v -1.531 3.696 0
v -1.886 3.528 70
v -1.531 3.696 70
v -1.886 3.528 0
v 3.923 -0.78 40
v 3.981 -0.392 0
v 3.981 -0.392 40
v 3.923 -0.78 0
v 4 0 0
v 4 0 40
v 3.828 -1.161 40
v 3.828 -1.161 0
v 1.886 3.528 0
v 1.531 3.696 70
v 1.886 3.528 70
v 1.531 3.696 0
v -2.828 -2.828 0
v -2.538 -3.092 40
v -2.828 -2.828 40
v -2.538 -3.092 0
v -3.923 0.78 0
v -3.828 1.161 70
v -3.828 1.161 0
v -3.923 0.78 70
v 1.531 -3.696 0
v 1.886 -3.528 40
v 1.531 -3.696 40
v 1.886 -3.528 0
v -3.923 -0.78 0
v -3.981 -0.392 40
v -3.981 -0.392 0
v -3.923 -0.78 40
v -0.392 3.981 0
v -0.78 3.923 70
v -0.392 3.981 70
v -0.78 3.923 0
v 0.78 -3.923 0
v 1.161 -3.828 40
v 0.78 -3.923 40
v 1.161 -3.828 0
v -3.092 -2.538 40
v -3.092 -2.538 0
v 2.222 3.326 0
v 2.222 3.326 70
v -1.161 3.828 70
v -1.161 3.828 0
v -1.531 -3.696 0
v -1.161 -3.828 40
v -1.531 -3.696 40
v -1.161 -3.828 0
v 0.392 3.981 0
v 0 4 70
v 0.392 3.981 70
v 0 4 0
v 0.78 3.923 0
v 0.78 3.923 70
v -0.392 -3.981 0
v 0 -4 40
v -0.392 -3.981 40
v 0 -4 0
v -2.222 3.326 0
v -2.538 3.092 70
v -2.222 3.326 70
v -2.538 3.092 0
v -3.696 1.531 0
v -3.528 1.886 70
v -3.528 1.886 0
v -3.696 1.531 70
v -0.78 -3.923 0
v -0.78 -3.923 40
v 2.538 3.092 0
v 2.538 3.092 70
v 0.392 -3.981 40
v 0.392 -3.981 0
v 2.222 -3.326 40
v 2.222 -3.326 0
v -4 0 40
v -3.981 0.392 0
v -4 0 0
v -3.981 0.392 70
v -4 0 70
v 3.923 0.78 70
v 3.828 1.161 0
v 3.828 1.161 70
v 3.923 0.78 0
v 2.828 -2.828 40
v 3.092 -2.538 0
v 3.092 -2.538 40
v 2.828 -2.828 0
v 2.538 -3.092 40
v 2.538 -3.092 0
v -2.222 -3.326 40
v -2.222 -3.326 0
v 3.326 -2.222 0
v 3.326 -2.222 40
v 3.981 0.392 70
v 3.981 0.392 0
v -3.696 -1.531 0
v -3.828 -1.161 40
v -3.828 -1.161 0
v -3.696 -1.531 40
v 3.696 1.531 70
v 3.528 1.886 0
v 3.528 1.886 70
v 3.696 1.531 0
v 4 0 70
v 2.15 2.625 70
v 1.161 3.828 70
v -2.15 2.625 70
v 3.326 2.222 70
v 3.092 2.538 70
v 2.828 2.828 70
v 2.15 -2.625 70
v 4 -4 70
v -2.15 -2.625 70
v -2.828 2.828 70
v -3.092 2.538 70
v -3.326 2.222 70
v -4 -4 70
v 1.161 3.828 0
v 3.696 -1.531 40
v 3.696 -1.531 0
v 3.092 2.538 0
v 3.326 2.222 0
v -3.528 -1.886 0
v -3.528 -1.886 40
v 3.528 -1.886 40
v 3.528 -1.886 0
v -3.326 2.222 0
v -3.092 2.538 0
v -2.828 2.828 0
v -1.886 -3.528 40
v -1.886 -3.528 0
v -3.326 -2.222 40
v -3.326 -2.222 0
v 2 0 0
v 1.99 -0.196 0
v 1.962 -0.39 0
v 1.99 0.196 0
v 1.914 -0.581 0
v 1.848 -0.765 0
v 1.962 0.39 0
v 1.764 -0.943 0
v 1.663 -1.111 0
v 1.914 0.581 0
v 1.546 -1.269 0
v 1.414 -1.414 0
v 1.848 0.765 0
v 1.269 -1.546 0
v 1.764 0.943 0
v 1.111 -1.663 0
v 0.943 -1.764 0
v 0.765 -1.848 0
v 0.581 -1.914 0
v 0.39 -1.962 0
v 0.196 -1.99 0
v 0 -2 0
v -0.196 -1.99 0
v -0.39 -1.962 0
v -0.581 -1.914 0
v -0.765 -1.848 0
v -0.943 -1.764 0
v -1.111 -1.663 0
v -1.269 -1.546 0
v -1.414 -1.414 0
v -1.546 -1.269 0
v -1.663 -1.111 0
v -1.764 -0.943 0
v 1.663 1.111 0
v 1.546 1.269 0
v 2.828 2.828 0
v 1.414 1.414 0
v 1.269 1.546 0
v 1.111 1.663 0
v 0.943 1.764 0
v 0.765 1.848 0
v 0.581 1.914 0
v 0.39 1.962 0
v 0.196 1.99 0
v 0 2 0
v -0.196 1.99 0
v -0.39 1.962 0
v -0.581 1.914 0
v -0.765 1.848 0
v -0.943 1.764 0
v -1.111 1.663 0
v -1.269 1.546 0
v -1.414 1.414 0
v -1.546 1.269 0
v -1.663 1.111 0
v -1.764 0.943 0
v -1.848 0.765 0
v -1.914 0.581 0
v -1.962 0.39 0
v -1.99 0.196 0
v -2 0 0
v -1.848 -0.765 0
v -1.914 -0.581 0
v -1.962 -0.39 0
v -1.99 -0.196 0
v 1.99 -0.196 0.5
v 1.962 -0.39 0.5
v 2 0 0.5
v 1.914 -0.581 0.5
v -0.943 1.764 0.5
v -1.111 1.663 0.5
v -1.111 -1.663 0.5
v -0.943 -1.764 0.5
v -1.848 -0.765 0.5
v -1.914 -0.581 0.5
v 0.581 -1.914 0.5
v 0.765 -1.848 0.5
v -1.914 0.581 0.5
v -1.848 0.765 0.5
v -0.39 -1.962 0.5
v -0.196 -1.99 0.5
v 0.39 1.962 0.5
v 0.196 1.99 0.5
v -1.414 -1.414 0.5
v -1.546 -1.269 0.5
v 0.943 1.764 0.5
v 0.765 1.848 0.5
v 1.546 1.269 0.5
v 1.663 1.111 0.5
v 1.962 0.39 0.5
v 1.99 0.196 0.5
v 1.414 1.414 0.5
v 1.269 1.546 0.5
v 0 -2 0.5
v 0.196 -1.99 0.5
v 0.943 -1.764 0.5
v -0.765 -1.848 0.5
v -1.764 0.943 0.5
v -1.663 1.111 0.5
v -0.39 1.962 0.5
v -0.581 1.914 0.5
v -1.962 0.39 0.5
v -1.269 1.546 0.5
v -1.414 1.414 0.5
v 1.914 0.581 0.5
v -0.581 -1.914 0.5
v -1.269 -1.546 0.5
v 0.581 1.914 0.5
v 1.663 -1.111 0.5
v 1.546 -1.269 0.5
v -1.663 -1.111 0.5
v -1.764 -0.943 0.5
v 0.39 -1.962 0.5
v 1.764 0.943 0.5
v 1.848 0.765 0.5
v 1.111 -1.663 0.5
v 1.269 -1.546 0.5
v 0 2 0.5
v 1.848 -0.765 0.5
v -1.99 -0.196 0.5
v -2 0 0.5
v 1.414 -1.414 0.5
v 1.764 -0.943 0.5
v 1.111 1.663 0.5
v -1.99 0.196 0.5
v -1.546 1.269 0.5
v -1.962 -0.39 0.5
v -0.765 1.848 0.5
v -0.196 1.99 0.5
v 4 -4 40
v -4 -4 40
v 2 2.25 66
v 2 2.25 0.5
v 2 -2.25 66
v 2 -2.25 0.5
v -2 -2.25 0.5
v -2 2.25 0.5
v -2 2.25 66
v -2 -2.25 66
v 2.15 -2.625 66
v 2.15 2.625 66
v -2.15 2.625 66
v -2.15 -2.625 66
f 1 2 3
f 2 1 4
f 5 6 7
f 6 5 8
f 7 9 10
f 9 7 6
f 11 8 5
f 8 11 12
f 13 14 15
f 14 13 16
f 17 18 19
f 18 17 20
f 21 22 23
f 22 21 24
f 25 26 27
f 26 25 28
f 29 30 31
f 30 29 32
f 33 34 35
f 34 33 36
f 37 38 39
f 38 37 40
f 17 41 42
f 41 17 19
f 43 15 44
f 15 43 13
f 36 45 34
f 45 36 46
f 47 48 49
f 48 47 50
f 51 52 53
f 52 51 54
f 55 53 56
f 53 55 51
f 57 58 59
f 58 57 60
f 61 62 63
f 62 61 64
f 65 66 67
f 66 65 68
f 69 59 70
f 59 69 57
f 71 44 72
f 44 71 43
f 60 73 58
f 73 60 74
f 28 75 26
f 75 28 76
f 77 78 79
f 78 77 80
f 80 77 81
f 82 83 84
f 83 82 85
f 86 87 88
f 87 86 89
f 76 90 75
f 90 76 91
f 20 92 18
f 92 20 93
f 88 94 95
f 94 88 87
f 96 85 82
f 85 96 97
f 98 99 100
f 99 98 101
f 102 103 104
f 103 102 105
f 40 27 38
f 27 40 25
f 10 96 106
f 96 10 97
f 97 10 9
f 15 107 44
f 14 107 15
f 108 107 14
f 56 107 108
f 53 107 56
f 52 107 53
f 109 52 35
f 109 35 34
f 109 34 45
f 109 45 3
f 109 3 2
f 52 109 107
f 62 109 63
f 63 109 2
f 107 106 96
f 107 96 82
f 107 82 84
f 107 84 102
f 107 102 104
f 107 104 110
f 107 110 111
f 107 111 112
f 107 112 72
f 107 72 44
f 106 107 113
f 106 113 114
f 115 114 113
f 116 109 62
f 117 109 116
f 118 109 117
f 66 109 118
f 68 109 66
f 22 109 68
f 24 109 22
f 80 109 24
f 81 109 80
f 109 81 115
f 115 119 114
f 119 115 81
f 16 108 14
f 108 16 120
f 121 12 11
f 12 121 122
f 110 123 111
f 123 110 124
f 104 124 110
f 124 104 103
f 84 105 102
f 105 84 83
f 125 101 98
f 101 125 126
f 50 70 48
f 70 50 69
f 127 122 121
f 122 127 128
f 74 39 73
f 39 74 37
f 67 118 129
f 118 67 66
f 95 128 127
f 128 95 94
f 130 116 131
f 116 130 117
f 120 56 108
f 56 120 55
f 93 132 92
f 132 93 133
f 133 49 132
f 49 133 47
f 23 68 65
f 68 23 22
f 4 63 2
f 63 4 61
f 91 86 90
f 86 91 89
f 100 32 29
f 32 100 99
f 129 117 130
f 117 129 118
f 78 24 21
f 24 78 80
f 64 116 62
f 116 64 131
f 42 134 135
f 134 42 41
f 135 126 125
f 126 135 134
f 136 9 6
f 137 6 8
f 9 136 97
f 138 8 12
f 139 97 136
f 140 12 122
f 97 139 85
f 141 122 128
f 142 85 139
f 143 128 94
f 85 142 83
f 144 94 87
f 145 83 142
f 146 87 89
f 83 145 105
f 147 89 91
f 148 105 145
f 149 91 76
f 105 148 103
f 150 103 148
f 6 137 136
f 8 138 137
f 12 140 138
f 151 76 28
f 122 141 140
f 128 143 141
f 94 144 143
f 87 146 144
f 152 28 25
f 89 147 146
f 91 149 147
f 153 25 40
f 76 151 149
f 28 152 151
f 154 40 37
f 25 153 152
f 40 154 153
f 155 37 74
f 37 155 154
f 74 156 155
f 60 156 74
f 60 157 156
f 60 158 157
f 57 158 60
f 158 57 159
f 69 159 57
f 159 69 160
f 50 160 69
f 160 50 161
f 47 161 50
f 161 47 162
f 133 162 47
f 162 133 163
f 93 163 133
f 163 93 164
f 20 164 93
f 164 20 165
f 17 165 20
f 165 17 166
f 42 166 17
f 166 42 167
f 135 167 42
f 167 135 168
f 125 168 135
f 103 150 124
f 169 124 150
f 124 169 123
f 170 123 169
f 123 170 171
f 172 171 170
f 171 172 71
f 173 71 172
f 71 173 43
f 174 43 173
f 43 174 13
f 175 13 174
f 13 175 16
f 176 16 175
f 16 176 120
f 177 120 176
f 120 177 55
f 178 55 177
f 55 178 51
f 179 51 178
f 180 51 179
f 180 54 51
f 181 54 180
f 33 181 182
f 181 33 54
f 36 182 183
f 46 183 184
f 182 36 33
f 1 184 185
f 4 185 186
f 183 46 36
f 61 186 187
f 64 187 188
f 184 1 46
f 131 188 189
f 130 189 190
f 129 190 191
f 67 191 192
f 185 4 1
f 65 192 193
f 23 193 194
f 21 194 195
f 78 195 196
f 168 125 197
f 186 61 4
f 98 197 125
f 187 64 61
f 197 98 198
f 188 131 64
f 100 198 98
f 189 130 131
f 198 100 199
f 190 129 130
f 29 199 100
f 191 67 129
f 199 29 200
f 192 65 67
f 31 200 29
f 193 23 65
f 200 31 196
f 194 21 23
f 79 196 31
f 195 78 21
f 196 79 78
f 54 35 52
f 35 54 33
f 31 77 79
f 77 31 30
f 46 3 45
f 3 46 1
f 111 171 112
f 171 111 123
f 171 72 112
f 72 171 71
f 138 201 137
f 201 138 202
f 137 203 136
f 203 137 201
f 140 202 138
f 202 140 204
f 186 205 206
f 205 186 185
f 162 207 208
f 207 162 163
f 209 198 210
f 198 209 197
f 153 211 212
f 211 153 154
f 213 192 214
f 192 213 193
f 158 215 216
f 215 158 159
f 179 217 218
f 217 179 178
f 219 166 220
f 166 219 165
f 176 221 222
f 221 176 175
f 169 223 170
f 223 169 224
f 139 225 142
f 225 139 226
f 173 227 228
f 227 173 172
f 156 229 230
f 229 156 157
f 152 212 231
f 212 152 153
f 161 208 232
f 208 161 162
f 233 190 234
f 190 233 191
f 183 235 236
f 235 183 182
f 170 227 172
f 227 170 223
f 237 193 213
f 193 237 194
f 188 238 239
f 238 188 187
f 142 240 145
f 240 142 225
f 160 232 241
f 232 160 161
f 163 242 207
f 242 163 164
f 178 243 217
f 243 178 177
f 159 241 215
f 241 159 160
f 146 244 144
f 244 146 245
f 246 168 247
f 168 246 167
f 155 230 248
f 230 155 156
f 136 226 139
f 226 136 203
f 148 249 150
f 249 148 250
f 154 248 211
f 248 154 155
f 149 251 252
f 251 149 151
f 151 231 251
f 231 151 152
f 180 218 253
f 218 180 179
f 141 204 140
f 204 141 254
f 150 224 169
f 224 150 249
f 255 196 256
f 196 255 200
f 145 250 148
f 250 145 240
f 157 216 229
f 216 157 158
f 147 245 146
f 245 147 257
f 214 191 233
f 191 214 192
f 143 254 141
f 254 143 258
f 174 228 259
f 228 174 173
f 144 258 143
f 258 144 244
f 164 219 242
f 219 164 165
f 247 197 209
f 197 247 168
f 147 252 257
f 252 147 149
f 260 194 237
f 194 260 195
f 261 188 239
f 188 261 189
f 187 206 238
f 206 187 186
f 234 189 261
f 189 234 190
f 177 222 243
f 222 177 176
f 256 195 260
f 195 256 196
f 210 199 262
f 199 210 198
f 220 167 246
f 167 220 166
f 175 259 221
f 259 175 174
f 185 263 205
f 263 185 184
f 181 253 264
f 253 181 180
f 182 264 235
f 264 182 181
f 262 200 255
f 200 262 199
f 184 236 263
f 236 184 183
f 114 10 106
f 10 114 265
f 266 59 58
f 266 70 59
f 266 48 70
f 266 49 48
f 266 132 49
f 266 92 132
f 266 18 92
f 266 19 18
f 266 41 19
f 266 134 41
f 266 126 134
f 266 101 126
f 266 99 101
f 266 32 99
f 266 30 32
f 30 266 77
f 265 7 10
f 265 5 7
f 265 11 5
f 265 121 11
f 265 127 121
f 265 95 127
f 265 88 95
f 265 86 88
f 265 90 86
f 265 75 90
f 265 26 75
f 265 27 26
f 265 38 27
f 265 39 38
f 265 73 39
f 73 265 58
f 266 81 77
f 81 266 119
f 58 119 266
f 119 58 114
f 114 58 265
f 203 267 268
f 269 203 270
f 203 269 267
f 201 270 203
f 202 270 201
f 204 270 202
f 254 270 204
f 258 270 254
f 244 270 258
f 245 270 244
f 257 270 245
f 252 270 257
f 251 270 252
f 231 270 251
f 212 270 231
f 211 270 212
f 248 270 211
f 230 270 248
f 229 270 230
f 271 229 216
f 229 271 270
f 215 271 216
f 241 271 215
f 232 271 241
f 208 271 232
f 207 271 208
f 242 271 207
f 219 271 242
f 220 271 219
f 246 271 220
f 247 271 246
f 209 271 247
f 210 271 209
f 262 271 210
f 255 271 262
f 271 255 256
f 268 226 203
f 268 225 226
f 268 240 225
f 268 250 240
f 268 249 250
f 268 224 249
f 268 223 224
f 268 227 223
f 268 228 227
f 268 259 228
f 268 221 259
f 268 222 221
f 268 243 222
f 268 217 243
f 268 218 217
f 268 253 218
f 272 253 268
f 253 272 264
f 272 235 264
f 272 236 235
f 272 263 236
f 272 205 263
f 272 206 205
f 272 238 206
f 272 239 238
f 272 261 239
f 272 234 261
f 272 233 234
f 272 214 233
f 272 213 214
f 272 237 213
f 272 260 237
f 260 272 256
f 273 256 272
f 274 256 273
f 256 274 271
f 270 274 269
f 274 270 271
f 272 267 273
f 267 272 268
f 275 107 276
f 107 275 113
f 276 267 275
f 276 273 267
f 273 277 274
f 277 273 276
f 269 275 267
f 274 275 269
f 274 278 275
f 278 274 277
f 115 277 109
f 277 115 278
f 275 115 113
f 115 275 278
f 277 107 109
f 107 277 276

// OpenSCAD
photoDiodeLength = 4.5;
photoDiodeWidth = 4.0;
photoDiodeHeight = 2;

photoDiodeMaxLength = 5.25;
photoDiodeMaxWidth = 4.3;

bodyLength = 70;
bodyShellWidth = 2;
bodyOuterDiameter = photoDiodeWidth + (bodyShellWidth * 2);

pinholeDiameter = 4.0;
pinholeLength = 0.5;

supportLength = 30;

backOpeningLength = 2;

rotate([180, 0, 0]) {
    translate([0, 0, -bodyLength]) {
        difference() {
            difference() {
                union() {
                // Support
                translate([-(bodyOuterDiameter / 2), 0, 0])
                    cube([bodyOuterDiameter, (bodyOuterDiameter / 2), supportLength]);

                    difference() {
                        // Main body
                        cylinder(h = bodyLength, d = bodyOuterDiameter, center = false, $fn = 64);
                    
                        // Pinhole
                        translate([0, 0, (bodyLength - 2)])
                            cylinder(h = (pinholeLength * 6), d = pinholeDiameter, center = false, $fn = 64);       
                    }
                }

                // Main hole
                translate([-(photoDiodeWidth / 2), -(photoDiodeLength / 2), -pinholeLength])
                    cube([photoDiodeWidth, photoDiodeLength, bodyLength]);
            }
            
            // Photodiode socket
            translate([-(photoDiodeMaxWidth / 2), -(photoDiodeMaxLength / 2), -1])
                cube([photoDiodeMaxWidth, photoDiodeMaxLength, (photoDiodeHeight + backOpeningLength + 1)]);
            
        }
    }
}
